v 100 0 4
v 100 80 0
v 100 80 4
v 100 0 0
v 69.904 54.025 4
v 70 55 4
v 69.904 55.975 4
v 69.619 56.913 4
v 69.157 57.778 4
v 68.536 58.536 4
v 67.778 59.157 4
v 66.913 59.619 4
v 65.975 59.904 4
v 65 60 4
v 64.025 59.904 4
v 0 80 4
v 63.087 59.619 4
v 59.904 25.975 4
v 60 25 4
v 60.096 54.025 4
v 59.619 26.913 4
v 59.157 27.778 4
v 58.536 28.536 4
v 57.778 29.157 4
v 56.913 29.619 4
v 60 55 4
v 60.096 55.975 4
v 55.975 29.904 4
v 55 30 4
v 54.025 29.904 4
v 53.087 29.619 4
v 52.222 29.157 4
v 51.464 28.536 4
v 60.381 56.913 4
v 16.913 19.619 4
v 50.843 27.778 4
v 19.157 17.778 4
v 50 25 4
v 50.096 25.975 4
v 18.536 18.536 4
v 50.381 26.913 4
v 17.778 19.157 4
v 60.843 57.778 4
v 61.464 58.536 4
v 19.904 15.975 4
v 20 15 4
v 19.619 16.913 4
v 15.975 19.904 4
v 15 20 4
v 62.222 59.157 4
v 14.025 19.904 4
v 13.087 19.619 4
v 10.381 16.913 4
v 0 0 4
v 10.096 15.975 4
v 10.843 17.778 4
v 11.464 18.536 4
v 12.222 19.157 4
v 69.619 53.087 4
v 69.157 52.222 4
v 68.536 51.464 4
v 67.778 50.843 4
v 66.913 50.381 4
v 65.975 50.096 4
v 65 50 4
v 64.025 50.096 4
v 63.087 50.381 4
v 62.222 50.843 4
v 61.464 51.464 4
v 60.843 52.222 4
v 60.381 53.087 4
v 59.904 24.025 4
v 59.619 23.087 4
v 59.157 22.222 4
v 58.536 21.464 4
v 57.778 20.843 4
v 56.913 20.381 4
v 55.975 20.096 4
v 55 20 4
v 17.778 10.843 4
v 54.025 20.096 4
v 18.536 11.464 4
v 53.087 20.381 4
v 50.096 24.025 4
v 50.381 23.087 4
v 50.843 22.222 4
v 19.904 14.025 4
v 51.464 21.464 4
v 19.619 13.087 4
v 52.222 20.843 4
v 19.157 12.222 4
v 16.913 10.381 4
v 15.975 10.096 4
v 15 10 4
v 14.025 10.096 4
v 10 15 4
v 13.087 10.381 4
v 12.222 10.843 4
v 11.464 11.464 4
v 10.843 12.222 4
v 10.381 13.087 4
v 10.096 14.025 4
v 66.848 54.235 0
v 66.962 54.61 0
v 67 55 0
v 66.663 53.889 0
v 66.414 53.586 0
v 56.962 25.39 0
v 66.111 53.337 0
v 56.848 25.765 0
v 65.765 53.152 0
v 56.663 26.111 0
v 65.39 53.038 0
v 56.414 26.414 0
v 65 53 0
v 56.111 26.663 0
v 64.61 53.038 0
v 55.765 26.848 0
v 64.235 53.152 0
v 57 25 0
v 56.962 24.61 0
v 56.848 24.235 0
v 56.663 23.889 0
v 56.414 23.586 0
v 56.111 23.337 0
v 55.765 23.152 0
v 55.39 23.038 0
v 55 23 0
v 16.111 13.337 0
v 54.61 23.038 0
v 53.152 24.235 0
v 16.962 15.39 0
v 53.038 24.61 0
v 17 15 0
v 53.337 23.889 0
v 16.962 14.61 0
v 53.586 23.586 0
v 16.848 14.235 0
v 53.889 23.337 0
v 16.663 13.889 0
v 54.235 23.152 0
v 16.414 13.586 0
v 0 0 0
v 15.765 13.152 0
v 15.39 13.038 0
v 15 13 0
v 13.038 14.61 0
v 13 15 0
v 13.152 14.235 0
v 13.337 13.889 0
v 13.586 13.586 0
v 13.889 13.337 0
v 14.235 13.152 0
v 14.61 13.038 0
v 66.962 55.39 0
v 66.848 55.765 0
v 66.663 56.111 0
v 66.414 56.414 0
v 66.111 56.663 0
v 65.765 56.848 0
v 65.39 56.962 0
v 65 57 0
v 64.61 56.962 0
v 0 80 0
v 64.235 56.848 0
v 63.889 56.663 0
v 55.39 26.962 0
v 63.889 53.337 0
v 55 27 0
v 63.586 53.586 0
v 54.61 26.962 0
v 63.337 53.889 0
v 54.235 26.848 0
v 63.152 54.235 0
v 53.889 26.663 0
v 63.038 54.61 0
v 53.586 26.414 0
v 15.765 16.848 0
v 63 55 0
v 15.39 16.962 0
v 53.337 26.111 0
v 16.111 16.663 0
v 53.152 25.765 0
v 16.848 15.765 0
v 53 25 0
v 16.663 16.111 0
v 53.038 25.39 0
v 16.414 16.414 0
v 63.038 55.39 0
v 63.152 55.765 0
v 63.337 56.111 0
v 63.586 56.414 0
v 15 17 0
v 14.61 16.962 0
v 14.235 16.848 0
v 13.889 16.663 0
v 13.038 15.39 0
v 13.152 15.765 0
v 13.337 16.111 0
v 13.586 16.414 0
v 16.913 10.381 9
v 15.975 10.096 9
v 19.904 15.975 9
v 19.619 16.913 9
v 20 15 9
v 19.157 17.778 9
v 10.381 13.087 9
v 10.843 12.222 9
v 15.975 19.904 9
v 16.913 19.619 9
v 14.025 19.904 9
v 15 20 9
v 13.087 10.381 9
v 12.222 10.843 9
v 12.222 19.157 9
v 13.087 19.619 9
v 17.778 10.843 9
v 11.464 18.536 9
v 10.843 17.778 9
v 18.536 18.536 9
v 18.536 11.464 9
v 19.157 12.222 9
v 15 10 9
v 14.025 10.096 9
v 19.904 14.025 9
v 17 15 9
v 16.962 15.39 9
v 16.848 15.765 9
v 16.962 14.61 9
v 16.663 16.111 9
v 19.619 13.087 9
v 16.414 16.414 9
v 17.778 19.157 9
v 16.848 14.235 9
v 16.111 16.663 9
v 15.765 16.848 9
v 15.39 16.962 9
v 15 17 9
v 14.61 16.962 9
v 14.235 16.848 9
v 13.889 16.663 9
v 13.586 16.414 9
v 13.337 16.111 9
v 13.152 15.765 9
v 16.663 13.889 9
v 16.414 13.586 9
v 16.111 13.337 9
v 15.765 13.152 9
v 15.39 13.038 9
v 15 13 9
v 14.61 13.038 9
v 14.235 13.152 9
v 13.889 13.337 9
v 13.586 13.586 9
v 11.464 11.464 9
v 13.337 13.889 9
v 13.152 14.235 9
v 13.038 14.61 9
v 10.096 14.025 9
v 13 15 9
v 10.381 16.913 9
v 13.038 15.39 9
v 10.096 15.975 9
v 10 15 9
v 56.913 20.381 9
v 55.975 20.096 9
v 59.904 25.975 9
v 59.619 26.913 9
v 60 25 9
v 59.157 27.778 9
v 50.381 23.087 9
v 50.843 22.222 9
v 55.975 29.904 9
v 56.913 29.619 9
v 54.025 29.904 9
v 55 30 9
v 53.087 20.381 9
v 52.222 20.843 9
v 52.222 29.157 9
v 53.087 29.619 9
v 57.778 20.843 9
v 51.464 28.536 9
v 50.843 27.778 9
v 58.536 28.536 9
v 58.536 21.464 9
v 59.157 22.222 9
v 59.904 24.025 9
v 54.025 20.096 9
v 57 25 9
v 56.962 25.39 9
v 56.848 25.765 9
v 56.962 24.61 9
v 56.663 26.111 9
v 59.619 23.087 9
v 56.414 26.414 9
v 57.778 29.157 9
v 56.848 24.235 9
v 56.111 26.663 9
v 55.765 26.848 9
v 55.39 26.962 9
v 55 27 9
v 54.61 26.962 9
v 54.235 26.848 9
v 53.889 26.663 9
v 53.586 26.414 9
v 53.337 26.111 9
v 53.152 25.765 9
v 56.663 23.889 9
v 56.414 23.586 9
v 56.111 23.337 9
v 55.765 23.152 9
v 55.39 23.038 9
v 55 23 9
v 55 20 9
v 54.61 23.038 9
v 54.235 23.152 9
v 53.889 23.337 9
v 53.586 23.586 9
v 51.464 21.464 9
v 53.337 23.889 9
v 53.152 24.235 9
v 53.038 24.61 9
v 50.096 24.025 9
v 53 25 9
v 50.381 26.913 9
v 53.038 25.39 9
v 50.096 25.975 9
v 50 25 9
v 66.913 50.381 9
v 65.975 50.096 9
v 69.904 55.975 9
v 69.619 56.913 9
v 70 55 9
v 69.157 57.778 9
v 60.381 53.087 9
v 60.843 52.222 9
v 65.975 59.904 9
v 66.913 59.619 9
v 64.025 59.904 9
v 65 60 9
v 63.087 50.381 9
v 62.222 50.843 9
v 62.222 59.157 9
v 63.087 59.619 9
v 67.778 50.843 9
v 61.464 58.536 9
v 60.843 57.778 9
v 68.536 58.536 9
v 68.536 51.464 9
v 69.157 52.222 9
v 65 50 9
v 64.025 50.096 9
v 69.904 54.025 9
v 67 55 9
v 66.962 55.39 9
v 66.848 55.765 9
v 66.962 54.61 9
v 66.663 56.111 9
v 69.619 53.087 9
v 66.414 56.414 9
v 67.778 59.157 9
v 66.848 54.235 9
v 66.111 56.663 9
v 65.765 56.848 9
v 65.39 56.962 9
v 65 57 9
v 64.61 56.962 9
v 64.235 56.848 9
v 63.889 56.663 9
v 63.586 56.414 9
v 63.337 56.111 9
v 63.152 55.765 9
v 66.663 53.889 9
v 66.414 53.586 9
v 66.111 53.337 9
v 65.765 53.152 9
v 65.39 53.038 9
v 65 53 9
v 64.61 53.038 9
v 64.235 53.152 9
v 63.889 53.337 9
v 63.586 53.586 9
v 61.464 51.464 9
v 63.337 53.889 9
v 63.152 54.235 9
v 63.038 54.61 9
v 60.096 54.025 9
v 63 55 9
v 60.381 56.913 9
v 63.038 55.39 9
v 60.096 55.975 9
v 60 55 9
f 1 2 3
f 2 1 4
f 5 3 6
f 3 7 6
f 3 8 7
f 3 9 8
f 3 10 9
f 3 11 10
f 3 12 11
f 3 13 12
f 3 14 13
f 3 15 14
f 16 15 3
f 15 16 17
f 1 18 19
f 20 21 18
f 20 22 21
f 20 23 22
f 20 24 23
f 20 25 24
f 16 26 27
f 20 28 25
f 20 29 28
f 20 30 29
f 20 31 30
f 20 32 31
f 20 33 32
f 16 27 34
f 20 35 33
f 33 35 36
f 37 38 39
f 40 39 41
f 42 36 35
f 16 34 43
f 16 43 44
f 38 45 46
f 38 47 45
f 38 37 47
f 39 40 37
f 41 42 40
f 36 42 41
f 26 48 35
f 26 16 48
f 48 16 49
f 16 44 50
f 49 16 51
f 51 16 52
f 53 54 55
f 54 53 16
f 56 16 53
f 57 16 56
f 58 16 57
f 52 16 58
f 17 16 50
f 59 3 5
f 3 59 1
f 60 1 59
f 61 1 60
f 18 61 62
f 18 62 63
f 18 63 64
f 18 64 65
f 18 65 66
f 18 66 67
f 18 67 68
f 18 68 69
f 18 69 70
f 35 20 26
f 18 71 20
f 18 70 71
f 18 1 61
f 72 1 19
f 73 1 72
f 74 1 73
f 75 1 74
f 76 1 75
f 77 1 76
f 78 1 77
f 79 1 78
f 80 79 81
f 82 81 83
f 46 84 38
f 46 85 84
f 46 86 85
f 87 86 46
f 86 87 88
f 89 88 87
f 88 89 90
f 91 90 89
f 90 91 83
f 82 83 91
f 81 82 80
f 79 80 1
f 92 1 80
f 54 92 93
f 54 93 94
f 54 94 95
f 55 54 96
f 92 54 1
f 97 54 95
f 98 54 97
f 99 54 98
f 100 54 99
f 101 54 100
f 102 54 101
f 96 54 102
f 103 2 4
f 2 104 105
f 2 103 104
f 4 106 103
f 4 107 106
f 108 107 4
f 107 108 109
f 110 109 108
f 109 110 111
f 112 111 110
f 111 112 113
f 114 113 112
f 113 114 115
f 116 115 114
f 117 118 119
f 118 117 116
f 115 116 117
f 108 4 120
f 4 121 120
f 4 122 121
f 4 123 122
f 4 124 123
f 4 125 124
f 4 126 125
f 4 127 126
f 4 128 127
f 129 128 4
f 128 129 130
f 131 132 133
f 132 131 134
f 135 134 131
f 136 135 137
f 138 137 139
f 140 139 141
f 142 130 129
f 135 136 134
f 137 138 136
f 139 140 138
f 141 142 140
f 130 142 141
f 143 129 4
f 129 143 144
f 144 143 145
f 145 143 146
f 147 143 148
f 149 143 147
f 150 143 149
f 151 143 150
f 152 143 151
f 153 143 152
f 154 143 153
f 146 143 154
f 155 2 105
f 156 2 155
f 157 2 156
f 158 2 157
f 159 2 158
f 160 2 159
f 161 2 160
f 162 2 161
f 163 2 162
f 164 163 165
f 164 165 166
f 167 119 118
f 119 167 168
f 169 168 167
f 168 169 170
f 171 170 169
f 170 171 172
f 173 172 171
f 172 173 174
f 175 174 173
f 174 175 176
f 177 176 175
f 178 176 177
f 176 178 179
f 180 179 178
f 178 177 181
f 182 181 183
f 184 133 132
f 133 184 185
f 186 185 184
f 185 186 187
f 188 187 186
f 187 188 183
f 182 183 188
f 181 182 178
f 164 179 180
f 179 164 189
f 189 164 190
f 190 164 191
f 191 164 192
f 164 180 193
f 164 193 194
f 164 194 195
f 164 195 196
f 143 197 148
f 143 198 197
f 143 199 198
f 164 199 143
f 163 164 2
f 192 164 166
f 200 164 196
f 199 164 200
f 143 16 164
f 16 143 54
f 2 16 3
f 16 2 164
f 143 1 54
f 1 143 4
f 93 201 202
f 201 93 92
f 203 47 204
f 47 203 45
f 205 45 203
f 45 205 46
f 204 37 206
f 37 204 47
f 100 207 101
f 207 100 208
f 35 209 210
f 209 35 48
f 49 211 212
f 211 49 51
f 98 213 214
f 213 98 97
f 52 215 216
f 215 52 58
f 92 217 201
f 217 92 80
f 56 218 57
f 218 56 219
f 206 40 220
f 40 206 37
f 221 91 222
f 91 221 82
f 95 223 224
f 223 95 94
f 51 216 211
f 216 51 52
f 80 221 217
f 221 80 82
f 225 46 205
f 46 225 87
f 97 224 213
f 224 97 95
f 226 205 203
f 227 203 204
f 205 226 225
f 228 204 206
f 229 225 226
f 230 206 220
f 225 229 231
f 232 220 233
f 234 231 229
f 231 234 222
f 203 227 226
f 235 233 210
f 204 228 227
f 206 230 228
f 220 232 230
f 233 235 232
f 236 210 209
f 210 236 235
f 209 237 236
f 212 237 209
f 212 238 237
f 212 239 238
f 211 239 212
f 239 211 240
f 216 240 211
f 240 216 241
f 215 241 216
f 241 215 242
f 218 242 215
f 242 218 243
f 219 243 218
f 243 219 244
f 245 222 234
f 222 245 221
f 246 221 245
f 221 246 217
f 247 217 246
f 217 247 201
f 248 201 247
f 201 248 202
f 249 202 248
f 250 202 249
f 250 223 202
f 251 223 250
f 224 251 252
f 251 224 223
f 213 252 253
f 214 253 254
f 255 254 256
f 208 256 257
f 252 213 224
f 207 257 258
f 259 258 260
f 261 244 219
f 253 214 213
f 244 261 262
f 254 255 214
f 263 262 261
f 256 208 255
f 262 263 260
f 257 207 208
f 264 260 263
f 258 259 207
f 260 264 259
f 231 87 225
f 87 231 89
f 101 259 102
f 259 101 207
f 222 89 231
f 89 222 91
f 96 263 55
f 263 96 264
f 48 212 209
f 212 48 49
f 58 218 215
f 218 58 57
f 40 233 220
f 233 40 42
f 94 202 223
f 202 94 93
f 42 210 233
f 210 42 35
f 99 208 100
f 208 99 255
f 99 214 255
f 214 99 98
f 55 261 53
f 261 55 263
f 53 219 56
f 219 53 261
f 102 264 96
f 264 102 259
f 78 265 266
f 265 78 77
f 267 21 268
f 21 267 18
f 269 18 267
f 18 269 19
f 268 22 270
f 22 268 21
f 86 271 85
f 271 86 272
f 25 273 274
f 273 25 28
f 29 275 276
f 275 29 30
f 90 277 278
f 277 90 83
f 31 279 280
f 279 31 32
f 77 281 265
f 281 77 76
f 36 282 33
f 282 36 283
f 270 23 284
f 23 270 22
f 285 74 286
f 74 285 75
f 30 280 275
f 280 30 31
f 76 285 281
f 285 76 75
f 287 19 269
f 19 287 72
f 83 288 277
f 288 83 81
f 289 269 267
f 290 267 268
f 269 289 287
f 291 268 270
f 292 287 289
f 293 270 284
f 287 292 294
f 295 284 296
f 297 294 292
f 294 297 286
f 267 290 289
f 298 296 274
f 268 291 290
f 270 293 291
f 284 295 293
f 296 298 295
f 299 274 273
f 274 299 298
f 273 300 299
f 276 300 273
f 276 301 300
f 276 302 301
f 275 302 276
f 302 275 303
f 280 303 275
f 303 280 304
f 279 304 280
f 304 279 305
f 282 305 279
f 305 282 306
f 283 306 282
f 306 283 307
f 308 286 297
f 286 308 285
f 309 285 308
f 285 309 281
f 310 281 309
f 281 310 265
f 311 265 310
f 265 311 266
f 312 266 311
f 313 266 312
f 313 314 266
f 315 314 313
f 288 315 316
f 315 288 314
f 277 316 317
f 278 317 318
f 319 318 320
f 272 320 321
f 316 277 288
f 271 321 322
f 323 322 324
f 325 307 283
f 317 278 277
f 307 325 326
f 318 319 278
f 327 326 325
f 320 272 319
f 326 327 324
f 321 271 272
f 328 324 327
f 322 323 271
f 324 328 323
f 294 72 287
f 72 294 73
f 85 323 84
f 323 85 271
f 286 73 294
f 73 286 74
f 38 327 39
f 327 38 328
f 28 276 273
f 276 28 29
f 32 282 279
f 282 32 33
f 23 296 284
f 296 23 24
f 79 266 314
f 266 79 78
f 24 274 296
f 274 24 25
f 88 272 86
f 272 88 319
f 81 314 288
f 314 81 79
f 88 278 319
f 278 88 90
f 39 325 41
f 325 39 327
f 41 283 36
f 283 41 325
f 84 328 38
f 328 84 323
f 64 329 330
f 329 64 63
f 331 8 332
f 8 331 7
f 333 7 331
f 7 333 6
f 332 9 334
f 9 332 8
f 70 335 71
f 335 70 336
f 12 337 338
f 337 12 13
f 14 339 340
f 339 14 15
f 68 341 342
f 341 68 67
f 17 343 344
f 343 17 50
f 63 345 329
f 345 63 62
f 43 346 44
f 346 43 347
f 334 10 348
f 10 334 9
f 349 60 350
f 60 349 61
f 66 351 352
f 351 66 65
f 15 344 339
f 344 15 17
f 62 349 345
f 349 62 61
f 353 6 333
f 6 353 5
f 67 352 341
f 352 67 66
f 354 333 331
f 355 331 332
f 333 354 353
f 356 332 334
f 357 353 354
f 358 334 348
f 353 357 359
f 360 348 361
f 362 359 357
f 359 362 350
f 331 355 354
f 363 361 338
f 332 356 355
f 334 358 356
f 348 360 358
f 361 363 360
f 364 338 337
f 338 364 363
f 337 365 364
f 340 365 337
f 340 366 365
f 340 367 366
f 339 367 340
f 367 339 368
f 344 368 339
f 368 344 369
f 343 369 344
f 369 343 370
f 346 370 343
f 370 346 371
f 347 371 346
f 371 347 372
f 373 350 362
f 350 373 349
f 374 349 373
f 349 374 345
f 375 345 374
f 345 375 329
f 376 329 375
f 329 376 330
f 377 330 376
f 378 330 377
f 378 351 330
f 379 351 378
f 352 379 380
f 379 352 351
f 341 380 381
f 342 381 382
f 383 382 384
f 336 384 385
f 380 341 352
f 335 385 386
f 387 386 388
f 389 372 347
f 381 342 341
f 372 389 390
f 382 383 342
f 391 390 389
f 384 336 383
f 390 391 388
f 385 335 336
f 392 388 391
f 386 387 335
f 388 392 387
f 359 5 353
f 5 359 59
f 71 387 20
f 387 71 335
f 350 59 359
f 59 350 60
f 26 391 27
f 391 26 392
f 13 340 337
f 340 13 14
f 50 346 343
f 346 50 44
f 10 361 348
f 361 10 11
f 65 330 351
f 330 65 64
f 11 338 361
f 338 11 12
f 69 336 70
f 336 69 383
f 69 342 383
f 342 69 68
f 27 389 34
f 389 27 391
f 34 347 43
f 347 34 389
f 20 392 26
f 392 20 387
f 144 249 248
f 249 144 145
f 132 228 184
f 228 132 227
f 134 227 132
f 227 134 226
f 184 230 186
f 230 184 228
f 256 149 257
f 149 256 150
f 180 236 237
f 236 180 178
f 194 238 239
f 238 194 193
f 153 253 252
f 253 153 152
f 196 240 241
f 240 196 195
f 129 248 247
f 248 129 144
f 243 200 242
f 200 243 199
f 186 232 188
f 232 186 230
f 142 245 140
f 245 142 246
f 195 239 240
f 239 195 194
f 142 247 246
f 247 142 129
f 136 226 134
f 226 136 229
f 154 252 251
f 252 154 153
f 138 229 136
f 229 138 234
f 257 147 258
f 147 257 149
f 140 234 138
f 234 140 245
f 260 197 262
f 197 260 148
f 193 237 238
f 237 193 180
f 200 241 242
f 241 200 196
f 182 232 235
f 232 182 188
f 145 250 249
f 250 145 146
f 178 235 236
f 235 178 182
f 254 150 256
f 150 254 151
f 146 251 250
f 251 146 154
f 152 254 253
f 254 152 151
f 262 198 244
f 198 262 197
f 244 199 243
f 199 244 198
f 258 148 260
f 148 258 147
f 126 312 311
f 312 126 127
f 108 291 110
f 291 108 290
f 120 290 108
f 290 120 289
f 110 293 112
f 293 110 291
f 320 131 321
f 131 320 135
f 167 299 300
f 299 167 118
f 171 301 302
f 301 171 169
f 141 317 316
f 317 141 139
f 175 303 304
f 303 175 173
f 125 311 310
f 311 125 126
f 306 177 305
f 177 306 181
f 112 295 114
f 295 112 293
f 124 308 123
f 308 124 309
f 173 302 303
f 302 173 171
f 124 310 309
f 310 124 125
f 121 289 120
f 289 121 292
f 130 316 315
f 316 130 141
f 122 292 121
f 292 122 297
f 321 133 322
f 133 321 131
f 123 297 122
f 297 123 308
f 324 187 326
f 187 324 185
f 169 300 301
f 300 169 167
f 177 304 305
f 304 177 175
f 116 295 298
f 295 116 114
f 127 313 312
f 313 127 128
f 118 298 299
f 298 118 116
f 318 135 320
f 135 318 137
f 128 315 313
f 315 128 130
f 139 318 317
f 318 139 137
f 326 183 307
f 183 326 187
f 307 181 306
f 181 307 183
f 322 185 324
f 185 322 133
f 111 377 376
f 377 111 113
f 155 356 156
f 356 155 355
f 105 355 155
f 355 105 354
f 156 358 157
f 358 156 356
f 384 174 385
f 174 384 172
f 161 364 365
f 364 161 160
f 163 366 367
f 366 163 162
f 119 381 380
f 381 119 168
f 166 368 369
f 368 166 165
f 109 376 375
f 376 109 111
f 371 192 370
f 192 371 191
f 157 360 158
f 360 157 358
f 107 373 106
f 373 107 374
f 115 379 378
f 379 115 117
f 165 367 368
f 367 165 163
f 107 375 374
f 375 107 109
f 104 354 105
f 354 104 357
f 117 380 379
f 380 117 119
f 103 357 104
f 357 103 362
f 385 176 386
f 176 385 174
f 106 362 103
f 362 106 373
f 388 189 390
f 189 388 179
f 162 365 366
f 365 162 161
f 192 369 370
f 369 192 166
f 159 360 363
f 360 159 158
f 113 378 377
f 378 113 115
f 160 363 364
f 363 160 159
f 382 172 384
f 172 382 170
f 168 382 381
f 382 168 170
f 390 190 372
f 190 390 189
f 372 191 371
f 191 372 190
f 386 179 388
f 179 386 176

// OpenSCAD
$fn = 32;

// ----------------------------------------------------------------------
// Boss field: plate with bosses at given coordinates
// ----------------------------------------------------------------------

// --- parameters (mm) ---
plate_l = 100;            // plate length, X
plate_w = 80;             // plate width, Y
plate_t = 4;              // plate thickness, Z
boss_d = 10;              // boss diameter
boss_h = 5;               // boss height above the plate
bore_d = 4;               // boss bore

total_h = plate_t + boss_h;  // overall height

difference() {
  union() {
    cube([plate_l, plate_w, plate_t]);
    translate([15, 15, plate_t]) cylinder(h = boss_h, d = boss_d);
    translate([55, 25, plate_t]) cylinder(h = boss_h, d = boss_d);
    translate([65, 55, plate_t]) cylinder(h = boss_h, d = boss_d);
  }
  translate([15, 15, -1]) cylinder(h = total_h + 2, d = bore_d);
  translate([55, 25, -1]) cylinder(h = total_h + 2, d = bore_d);
  translate([65, 55, -1]) cylinder(h = total_h + 2, d = bore_d);
}
